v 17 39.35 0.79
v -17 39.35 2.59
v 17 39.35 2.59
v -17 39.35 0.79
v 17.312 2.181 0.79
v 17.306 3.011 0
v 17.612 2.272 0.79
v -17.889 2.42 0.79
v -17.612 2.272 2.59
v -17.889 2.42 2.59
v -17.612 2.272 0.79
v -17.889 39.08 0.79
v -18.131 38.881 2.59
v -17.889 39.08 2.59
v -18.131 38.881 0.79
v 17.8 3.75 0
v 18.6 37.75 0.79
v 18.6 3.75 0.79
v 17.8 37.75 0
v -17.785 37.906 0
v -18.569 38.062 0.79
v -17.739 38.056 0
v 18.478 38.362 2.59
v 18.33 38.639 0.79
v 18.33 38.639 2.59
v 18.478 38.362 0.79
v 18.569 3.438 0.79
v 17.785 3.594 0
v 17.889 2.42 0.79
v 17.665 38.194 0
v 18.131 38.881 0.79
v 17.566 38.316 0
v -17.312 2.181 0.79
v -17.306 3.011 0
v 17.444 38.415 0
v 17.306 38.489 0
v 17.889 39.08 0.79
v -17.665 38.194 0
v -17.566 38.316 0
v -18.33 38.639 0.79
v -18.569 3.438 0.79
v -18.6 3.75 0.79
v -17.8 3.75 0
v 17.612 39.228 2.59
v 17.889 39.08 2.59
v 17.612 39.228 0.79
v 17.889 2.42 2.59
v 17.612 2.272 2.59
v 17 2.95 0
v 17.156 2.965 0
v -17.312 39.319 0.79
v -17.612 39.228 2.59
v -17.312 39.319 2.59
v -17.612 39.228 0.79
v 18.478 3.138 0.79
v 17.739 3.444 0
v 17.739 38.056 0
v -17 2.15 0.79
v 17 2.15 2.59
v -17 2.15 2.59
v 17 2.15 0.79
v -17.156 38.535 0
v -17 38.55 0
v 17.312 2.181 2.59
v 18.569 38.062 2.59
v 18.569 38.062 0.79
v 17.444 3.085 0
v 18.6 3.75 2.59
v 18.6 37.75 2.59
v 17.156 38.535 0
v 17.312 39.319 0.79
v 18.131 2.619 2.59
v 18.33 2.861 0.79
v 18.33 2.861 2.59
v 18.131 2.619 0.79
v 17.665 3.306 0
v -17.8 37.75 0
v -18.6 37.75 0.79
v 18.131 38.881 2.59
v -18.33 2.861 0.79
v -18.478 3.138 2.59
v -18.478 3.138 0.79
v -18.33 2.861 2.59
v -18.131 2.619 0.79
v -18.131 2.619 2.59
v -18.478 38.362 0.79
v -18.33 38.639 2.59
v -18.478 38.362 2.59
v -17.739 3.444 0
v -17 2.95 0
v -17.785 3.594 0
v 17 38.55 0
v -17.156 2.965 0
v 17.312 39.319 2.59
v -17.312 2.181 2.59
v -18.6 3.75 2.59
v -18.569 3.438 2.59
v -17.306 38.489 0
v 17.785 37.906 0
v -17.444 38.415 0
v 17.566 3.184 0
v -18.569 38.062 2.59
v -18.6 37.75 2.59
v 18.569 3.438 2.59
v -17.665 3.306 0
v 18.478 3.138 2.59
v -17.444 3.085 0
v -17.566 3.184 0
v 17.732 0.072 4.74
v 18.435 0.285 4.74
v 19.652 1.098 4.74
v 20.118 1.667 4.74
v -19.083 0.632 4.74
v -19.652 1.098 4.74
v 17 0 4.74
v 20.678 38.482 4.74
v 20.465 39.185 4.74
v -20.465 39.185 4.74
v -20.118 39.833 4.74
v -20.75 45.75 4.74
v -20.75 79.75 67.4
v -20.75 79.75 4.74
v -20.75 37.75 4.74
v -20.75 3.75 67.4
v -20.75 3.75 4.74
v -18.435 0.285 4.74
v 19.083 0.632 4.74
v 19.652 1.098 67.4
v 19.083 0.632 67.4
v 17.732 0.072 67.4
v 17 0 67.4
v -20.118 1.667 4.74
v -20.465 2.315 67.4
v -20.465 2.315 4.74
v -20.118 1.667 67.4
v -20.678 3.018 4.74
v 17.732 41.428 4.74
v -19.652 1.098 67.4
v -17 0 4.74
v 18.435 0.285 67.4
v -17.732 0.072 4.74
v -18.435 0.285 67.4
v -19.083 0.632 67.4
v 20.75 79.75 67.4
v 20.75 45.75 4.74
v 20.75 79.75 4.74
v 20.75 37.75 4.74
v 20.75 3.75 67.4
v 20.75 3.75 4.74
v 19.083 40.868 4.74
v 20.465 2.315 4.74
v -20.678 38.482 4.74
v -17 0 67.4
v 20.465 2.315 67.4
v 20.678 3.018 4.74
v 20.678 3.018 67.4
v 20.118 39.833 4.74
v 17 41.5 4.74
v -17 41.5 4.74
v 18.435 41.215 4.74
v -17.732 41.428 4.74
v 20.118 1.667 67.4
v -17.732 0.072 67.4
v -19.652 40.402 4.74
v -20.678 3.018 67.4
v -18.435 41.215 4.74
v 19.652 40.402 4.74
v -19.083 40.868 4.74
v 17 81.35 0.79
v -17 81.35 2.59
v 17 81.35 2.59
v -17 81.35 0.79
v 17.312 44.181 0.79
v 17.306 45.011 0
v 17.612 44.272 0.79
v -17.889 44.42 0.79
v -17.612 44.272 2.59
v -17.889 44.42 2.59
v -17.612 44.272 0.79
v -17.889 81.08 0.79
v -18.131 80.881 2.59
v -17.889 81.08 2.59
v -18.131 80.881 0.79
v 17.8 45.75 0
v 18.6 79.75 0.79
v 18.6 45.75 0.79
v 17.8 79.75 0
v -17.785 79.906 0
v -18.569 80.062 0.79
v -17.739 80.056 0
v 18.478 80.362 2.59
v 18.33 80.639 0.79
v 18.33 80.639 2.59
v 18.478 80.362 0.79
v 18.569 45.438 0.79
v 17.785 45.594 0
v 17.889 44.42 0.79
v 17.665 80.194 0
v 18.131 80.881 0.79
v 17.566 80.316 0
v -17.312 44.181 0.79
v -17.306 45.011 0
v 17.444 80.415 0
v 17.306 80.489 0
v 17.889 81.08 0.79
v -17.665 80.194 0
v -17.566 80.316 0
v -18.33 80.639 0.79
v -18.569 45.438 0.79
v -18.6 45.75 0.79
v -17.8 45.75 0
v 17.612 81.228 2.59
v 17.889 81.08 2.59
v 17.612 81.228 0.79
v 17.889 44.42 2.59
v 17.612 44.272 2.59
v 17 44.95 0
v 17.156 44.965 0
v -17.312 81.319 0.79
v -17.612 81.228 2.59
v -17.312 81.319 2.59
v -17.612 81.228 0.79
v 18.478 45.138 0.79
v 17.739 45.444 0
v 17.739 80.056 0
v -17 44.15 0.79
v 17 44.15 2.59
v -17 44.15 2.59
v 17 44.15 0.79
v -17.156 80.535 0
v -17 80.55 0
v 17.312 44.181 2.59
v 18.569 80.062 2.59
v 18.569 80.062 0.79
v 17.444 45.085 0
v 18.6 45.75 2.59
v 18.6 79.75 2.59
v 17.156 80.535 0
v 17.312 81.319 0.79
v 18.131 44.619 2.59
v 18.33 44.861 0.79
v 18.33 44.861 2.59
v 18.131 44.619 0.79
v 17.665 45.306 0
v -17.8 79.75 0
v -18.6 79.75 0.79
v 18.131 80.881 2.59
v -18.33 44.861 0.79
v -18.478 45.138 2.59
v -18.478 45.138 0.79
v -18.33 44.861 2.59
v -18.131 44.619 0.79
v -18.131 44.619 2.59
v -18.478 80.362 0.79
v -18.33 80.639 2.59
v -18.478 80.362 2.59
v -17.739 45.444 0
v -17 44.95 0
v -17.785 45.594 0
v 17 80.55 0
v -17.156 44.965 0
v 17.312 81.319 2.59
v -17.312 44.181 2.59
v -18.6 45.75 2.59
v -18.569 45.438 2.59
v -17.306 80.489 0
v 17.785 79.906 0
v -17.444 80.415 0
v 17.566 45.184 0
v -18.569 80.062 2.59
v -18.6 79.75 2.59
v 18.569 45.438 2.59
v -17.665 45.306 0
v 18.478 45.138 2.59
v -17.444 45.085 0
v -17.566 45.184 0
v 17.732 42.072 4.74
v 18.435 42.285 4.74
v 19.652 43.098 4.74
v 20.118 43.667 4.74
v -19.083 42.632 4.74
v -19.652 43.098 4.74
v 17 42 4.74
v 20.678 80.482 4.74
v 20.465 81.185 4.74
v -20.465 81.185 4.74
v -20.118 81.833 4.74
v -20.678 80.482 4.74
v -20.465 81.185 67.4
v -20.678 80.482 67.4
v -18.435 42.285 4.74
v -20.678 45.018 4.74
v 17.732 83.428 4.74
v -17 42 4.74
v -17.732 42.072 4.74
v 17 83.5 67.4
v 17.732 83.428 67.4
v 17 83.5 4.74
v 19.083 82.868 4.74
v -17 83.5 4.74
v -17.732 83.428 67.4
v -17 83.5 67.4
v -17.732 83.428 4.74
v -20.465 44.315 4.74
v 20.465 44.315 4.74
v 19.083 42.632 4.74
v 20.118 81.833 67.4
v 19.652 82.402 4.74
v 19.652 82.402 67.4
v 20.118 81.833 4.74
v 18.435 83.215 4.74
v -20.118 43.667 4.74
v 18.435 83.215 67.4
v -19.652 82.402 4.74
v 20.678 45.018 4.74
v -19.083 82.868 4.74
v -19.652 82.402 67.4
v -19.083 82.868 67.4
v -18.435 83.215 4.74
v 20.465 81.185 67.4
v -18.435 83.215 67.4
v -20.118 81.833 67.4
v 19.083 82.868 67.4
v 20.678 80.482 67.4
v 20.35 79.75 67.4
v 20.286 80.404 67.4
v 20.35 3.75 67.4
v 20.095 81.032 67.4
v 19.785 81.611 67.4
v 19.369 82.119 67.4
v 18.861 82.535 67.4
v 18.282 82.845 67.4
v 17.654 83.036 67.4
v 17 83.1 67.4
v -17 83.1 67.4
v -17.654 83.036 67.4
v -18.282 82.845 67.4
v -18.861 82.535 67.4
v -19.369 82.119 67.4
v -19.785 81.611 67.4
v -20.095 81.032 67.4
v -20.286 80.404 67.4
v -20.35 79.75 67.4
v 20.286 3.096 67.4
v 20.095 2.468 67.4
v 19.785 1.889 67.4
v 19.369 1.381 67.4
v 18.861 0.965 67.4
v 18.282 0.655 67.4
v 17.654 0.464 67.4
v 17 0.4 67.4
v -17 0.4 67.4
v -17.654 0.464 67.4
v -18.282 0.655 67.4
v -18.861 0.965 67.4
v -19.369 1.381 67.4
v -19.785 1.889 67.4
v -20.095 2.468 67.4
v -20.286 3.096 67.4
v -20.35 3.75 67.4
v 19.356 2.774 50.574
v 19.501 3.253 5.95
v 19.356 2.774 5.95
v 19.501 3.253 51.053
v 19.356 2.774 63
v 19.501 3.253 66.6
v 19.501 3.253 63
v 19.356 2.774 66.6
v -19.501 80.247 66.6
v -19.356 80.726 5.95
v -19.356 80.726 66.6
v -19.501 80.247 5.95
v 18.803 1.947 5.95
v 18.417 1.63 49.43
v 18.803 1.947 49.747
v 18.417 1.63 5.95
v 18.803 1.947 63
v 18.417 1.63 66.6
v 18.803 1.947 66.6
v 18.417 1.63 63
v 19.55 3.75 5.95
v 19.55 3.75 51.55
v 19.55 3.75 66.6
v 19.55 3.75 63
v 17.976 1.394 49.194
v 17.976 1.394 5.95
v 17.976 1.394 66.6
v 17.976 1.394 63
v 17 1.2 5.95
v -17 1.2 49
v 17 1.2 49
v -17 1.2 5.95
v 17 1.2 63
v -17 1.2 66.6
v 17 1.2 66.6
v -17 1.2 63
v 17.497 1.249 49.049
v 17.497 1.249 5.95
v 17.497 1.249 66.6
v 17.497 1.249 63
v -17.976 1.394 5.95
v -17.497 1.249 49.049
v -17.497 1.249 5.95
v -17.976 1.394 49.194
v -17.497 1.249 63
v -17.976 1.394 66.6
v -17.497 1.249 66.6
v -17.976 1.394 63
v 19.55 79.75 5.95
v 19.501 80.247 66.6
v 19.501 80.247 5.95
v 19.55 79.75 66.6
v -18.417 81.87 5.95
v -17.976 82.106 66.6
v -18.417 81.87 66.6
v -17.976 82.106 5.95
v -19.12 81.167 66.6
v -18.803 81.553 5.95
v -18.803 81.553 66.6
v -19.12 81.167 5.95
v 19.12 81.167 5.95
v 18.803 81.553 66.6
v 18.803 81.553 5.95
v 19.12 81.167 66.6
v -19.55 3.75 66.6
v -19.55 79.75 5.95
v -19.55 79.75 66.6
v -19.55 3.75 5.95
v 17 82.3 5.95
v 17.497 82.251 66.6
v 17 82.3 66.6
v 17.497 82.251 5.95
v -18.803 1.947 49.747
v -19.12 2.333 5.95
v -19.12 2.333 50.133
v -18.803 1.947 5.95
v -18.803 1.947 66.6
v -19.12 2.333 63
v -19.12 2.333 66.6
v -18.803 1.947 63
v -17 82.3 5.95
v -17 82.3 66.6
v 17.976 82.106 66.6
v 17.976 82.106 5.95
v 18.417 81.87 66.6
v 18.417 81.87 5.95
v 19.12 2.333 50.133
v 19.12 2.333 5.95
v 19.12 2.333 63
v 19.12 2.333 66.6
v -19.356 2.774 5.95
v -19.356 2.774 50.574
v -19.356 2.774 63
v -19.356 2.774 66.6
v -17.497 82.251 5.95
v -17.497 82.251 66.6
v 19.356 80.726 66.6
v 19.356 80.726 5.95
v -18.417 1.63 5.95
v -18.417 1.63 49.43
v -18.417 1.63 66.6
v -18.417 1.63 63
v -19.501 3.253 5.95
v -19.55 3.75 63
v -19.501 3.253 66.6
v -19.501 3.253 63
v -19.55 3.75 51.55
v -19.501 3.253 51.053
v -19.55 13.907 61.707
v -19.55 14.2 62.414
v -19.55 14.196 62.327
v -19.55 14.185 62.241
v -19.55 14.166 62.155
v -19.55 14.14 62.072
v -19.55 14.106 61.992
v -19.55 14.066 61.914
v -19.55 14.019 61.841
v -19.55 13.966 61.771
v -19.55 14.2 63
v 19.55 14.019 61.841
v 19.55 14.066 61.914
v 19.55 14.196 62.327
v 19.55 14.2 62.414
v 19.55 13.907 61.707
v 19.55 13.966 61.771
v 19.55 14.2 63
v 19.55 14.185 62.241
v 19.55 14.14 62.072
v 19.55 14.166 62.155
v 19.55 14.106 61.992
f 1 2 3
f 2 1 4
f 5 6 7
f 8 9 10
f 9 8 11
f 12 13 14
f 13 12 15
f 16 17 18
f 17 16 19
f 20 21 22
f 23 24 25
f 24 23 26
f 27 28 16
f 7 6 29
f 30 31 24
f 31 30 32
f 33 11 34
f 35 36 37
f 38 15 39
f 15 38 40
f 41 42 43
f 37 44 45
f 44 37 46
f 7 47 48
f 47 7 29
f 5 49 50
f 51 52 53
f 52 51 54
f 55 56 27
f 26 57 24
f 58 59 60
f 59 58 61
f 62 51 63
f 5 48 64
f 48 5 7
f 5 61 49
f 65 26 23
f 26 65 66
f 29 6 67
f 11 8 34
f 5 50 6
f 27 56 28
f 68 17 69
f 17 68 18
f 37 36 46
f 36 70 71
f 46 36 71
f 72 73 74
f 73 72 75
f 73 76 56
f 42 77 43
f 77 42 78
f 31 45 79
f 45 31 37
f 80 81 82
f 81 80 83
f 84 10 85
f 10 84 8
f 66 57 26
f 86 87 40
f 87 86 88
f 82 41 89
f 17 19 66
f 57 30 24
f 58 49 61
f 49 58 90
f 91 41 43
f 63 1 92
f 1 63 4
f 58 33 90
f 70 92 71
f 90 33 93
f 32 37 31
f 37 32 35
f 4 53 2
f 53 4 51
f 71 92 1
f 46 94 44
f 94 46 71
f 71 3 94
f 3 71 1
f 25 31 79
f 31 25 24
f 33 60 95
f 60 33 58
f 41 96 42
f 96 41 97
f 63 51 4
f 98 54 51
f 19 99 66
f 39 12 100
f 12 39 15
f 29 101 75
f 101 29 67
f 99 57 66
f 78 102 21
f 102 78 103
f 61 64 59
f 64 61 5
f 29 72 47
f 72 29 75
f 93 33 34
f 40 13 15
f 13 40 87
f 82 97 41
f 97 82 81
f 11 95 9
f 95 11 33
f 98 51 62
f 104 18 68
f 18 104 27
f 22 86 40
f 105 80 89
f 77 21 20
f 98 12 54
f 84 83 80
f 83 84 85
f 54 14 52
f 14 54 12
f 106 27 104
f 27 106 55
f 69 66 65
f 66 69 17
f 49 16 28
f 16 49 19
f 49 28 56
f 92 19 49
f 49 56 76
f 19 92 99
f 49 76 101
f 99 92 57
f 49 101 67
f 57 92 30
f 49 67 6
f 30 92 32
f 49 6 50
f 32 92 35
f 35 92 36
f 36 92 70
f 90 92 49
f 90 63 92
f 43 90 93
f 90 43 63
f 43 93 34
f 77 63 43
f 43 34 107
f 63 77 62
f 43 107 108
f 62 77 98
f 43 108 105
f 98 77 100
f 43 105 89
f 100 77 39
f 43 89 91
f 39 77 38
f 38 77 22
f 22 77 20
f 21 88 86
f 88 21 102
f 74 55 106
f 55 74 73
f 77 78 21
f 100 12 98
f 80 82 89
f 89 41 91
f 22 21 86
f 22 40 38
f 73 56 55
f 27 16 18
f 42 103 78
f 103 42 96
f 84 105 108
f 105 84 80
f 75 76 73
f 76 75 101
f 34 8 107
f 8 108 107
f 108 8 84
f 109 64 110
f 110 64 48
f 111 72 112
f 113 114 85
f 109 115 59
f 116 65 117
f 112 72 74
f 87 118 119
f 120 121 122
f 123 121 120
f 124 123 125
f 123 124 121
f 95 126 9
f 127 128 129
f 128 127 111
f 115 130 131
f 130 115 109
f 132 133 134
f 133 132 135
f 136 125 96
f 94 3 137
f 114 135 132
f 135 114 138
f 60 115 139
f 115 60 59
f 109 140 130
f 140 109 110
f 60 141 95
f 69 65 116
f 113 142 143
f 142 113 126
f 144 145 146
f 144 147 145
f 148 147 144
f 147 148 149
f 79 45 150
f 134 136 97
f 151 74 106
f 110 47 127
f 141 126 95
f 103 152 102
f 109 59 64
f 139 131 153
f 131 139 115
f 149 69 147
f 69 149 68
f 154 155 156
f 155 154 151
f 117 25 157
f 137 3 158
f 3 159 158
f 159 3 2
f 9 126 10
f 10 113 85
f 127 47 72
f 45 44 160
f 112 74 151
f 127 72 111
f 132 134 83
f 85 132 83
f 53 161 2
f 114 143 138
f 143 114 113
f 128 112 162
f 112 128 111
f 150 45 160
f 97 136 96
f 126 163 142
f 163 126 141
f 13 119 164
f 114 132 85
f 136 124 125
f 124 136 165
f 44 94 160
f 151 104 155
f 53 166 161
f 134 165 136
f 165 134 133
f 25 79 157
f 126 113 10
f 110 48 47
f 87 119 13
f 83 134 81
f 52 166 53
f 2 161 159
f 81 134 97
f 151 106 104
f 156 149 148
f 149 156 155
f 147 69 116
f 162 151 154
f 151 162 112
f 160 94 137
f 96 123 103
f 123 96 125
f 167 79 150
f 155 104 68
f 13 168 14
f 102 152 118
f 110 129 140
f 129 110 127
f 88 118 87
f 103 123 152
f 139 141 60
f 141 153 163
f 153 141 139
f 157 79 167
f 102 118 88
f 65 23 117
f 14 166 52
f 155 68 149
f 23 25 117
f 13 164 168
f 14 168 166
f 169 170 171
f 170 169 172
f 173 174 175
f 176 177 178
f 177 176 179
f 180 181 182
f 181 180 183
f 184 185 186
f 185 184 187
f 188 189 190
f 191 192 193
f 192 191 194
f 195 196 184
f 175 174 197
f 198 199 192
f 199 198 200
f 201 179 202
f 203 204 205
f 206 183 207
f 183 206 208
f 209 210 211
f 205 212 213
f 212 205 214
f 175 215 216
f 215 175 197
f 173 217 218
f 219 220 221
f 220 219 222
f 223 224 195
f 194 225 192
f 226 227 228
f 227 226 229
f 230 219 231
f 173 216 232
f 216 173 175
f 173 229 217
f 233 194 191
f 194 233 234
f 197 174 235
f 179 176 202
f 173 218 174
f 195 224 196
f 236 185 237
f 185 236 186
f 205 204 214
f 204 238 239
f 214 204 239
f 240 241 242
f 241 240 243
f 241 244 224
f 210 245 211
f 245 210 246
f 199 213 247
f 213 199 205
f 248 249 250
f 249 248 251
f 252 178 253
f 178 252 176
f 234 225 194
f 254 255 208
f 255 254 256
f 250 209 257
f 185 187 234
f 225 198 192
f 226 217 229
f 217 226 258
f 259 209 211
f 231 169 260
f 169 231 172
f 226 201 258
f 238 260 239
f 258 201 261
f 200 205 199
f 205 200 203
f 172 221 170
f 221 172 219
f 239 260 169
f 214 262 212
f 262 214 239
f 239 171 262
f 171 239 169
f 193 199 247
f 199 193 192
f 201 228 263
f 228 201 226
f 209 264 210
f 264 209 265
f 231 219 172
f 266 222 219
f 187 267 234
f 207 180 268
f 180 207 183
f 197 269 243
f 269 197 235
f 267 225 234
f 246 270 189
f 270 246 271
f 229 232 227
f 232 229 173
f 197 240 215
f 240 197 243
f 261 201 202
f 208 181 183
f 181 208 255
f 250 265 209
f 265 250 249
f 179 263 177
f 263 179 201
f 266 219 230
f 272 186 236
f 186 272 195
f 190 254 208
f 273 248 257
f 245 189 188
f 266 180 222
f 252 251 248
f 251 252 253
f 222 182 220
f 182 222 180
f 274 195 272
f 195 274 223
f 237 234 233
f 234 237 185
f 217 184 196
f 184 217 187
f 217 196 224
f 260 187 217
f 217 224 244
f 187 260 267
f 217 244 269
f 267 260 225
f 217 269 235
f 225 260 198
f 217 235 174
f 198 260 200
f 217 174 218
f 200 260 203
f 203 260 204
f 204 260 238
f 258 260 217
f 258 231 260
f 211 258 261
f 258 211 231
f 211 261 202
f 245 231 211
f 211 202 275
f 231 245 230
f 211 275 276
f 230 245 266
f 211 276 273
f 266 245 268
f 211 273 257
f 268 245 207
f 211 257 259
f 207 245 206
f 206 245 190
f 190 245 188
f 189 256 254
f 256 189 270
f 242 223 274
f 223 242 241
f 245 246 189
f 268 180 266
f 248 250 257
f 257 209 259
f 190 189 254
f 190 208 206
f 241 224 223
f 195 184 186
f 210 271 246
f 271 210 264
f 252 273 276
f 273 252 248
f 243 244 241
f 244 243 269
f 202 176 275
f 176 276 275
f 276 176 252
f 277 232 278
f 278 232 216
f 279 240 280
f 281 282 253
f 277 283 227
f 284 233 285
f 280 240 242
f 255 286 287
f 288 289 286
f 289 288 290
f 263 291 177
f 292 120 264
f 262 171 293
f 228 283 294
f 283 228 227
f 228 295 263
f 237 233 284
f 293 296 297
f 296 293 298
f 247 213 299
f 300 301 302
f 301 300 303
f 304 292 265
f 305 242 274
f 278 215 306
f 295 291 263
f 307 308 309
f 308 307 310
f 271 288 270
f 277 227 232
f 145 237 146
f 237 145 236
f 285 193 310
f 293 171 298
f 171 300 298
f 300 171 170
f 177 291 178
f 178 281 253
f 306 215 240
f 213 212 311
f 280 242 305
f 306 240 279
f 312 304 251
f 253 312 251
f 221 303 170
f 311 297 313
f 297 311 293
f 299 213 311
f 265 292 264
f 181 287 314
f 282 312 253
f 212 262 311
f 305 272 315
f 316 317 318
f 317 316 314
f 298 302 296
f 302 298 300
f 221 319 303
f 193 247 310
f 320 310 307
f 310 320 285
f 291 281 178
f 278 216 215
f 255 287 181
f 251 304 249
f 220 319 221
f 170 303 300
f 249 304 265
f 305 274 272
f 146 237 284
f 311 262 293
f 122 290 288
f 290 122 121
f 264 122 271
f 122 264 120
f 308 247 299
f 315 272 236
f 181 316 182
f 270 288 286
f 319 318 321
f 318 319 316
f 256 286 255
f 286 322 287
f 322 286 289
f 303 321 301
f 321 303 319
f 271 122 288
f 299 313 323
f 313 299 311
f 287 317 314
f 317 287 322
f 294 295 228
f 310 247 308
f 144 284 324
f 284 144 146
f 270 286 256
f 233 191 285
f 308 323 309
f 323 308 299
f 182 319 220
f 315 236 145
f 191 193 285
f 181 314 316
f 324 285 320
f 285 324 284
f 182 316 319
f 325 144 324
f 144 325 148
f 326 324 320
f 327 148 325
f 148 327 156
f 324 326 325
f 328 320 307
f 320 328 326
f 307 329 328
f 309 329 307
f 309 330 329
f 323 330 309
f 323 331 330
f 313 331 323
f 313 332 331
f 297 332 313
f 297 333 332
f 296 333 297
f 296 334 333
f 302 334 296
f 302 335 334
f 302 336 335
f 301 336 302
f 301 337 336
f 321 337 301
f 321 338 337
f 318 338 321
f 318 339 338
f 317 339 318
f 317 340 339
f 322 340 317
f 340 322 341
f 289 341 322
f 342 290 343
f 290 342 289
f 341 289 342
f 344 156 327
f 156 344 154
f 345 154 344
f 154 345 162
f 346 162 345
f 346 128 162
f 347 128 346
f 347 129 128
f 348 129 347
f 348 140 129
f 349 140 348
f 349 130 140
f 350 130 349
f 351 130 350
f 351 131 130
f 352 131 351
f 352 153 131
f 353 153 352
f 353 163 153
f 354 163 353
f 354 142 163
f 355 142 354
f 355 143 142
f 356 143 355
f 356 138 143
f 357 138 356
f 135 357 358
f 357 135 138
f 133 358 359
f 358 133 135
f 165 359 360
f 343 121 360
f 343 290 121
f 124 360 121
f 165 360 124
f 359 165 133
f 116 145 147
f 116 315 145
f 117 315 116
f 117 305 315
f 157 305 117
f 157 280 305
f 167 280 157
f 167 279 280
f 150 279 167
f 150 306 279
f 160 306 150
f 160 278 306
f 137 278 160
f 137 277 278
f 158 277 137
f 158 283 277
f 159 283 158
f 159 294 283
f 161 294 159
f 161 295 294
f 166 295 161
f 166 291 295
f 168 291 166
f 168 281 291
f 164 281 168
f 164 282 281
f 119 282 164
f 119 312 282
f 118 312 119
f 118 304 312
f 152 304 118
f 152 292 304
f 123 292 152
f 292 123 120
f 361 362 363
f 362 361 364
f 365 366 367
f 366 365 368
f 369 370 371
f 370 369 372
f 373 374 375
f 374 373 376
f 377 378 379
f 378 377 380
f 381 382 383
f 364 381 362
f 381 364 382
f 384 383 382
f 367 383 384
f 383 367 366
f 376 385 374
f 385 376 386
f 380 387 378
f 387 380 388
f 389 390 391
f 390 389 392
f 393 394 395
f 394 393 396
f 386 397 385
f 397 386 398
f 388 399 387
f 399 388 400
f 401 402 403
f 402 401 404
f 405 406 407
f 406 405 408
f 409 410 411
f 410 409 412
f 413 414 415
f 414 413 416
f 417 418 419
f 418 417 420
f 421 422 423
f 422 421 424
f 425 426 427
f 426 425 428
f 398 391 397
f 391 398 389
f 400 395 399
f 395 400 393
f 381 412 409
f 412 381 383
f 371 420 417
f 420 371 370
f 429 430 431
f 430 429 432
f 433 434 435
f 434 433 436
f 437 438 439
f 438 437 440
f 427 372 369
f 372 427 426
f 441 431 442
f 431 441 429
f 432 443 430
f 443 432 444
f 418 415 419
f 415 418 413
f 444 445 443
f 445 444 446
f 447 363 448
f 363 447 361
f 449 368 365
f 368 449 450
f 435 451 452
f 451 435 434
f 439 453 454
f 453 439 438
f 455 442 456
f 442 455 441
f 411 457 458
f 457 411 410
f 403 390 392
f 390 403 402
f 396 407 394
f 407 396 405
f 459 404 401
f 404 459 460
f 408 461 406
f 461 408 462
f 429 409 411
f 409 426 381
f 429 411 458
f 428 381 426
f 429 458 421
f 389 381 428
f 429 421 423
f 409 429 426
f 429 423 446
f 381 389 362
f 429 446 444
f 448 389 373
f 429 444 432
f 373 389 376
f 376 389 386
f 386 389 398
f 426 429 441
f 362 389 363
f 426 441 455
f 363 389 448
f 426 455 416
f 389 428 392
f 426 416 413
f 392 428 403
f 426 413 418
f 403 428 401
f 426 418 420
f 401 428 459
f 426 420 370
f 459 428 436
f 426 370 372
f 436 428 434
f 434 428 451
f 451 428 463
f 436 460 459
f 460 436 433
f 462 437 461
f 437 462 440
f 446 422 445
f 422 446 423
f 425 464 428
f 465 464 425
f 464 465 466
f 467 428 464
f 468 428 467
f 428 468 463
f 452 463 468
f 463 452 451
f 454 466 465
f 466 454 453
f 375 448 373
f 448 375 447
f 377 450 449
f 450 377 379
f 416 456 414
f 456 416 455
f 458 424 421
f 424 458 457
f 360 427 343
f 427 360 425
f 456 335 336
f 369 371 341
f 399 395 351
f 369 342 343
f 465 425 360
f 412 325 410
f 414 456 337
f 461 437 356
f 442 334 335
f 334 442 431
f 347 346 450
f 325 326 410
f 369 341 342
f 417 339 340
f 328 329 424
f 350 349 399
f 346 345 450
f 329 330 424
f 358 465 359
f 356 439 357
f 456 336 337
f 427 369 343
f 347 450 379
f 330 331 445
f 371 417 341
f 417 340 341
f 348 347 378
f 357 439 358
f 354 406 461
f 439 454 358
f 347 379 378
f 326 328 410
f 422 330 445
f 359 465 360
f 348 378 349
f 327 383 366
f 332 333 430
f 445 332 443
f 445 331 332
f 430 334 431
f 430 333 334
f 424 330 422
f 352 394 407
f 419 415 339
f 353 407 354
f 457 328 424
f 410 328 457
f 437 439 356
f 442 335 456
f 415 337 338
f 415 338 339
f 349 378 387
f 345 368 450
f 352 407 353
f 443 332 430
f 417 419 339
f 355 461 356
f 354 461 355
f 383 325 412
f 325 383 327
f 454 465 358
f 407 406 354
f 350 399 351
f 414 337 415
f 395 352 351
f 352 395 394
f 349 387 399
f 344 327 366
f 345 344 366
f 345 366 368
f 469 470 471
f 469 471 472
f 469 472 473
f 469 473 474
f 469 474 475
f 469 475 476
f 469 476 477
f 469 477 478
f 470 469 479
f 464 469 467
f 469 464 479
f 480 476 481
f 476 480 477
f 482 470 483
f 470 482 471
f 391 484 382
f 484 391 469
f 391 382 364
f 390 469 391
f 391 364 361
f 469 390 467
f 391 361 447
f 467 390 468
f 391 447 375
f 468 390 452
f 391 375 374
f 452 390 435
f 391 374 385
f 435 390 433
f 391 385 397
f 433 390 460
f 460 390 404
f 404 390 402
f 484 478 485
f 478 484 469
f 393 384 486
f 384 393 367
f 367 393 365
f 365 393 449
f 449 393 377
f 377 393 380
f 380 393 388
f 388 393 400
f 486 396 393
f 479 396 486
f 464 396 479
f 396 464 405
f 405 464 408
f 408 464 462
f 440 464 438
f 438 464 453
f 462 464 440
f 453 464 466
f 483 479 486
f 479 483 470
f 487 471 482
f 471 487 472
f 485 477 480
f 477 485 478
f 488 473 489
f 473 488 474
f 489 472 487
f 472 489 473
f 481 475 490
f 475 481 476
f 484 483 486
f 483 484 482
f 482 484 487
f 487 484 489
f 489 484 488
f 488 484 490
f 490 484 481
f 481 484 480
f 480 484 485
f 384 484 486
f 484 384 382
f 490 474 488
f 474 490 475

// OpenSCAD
// file: ../../../modules/gridfinity.scad
// Gridfinity ベースプレートの共有 module。
// 寸法は Gridfinity 仕様 (Zack Freedman) の baseplate 輪郭に従う:
//   ピッチ 42、ソケット上端開口 41.5 (角 R4)、上から 45° 面取り 2.15 →
//   垂直 1.8 (37.2 角・R1.85) → 45° 面取り 0.7 → 底 35.8 角 (R1.15)。
//   ソケット深さ = 2.15 + 1.8 + 0.7 = 4.65。
//
// 座標系: X が列方向 (中央が 0)、Y が行方向 (板の前端が 0)、Z=0 が板の底面。
// 板の外形は grid とは独立に rim で与えるので、grid より大きい板 (縁付き) を
// 作れる。ソケットは rim=[left, right, front, back] の内側へ 42 ピッチで並ぶ。

gf_pitch = 42;
gf_socket_top = 41.5; // 上端開口
gf_socket_mid = 37.2; // 垂直部
gf_socket_bot = 35.8; // 底
gf_socket_r_top = 4;
gf_socket_r_mid = 1.85;
gf_socket_r_bot = 1.15;
gf_chamfer_top = 2.15;
gf_wall_h = 1.8;
gf_chamfer_bot = 0.7;
gf_socket_depth = gf_chamfer_top + gf_wall_h + gf_chamfer_bot; // 4.65
gf_fn = 32;
gf_eps = 0.01; // hull 用の薄板の厚さ
gf_over = 0.5; // 切削の抜き代

// 角丸正方形または矩形 (w は一辺、または [幅, 奥行き]、角 R)
module
gf_rounded_square(w, r)
{
    offset(r = r, $fn = gf_fn)
        square(is_list(w) ? w - [ 2 * r, 2 * r ] : w - 2 * r, center = true);
}

// 厚さ gf_eps の角丸正方形の薄板を z に置く (hull の骨)
module
gf_slab(w, r, z)
{
    translate([ 0, 0, z ]) linear_extrude(gf_eps) gf_rounded_square(w, r);
}

// ソケット1個の切削体。z=0 がソケットの底 (床の天面)、+Z へ 4.65 で天面に出る。
// clearance は嵌合の逃げで、輪郭を全周へ clearance だけ外へ出す (幅 +2c、角 R
// +c)。pitch_x は X 方向のセル幅。端数でも角 R と面取りの寸法を保つ。
module
gf_socket_cut(clearance = 0, pitch_x = gf_pitch)
{
    z1 = gf_chamfer_bot;
    z2 = z1 + gf_wall_h;
    z3 = gf_socket_depth;
    c = clearance;
    assert(pitch_x > gf_pitch - gf_socket_top + 2 * gf_socket_r_top,
           "Cell width is too small for the socket corner radius");
    delta = [ pitch_x - gf_pitch, 0 ];
    bot = [ gf_socket_bot + 2 * c, gf_socket_bot + 2 * c ] + delta;
    mid = [ gf_socket_mid + 2 * c, gf_socket_mid + 2 * c ] + delta;
    top = [ gf_socket_top + 2 * c, gf_socket_top + 2 * c ] + delta;
    hull()
    {
        gf_slab(bot, gf_socket_r_bot + c, 0);
        gf_slab(mid, gf_socket_r_mid + c, z1 - gf_eps);
    }
    hull()
    {
        gf_slab(mid, gf_socket_r_mid + c, z1 - gf_eps);
        gf_slab(mid, gf_socket_r_mid + c, z2 - gf_eps);
    }
    hull()
    {
        gf_slab(mid, gf_socket_r_mid + c, z2 - gf_eps);
        gf_slab(top, gf_socket_r_top + c, z3 - gf_eps);
    }
    // 天面より上へ抜く (天面と同一平面の退化した面を残さない)
    gf_slab(top, gf_socket_r_top + c, z3 - gf_eps);
    translate([ 0, 0, z3 - gf_eps ]) linear_extrude(gf_over + gf_eps)
        gf_rounded_square(top, gf_socket_r_top + c);
}

// ベースプレート。cols x rows のソケットを床 floor_t の上に彫る。
// rim = [left, right, front, back] はソケット列の外側に残す縁の幅。
// 板の幅 = cols*42 + left + right、奥行き = rows*42 + front + back。
// cols の端数は左端の細幅セルになる。rows は正の整数。
// clearance はソケットの嵌合の逃げ (gf_socket_cut を参照)。
module
gf_baseplate(cols, rows, rim = [ 0, 0, 0, 0 ], floor_t = 1, clearance = 0)
{
    grid_w = cols * gf_pitch;
    grid_d = rows * gf_pitch;
    plate_w = grid_w + rim[0] + rim[1];
    plate_d = grid_d + rim[2] + rim[3];
    x0 = -plate_w / 2 + rim[0]; // ソケット列の左端
    first_pitch = grid_w - (ceil(cols) - 1) * gf_pitch;
    difference()
    {
        translate([ -plate_w / 2, 0, 0 ])
            cube([ plate_w, plate_d, floor_t + gf_socket_depth ]);
        for (c = [0:ceil(cols) - 1], r = [0:rows - 1])
            translate([
                x0 + (c == 0 ? first_pitch / 2
                             : first_pitch + (c - 0.5) * gf_pitch),
                rim[2] + (r + 0.5) * gf_pitch,
                floor_t
            ]) gf_socket_cut(clearance, c == 0 ? first_pitch : gf_pitch);
    }
}
// file: ../../../modules/gridfinity_bins.scad
include <gridfinity_bin.scad>

// assets/gridfinity-bin/ の bin 群の共通値と、サイズ 3 引数の払い出し口。
// 単体では何も描かない。設計の経緯と確定値は
// ledger/designs/gridfinity-bin-4u.md が正本。
// 通常binは4U/9U、X={1,1.5,2,2.5,3} × Y={1,2,3,4,5,5.5}。
// 両軸に端数を持つ組み合わせはassetに置かない（各高さ28種）。
// Xが横、Yがラベルの壁から奥、unitsが高さ（7mm単位）。
wall = 1.2;    // 0.4 ノズル 3 本
floor_t = 1.2; // 底 (4.75) の上に載せる床。床の天面 z = 5.95
label_d = 13;  // 12mm 幅のラベルシールを貼る天板の張り出し
label_t = 1; // 天板の厚さ (user 指定)。下は 45° の無垢のくさび
label_r = 1; // 天板の先端と 45° 面の境目の R (user 指定)
// カードケース (goods/card_case_2x3x4u.scad) の値。カードは ISO/IEC 7810 ID-1 (85.6 × 54 ×
// 0.76、隅 R3) で、長辺を Y (rows 方向) に寝かせ、X 中央・手前の壁から 10 奥に置く。ポケットは
// カードより 1 大きい (片側 0.5)。右奥のマスは壁の内面まで抜き、床と底を外形に平行な 45° の窪みにする。
// ポケットの左右の埋めの天面 (幅 13.05) が 12mm のラベルを貼る帯。ポケットと穴の交点の
// 縦エッジは丸める (開口の上縁は丸めない: 壁を上端まで垂直に保ち、収まる枚数を減らさない)
card_w = 54;    // カードの短辺 (X)。user 指定「高さ 54」
card_d = 85.6;  // カードの長辺 (Y)。user 指定「幅 85.6」
card_clear = 1; // ポケットの余裕 (user 指定「+1mm」)
// ポケットの手前の辺の、手前の壁の内面からの距離 (user 指定「10mm」)
card_off = 10;
// ポケットの平面の隅 R (user 指定「角の丸み 3mm」。ID-1 の隅は 2.88..3.48)
card_r = 3;
// ポケットと穴が交わる所の、埋めの凸の縦エッジの R (指の当たる角)
card_edge_r = 2;
recess_skin = floor_t + 1.75; // 窪みの床 z (底の皮)。user 指定「壁厚と同じ 1.2 は過剰、1.75 返す」

function bin_contract(cols, rows, units) = str("CONTRACT units=",
                                               units,
                                               " pitch=",
                                               gf_pitch,
                                               " outer=",
                                               gfb_outer,
                                               " h=",
                                               units* gfb_unit,
                                               " lip=",
                                               gfb_lip_h,
                                               " base=",
                                               gfb_base_bot,
                                               "/",
                                               gfb_base_mid,
                                               "/",
                                               gfb_outer,
                                               " base_h=",
                                               gfb_base_h,
                                               " wall=",
                                               wall,
                                               " floor_top=",
                                               gfb_base_h + floor_t,
                                               " label=",
                                               label_d,
                                               "x",
                                               label_t,
                                               " wedge=45 fillet=",
                                               label_r,
                                               " bin=",
                                               cols,
                                               "x",
                                               rows,
                                               " size=",
                                               cols* gf_pitch - 0.5,
                                               "x",
                                               rows* gf_pitch - 0.5);

// (cols, rows, units) でラベル付き bin を払い出す。例: gridfinity_bin(2, 4, 4)
module
gridfinity_bin(cols, rows, units = 4)
{
    echo(bin_contract(cols, rows, units));
    gfb_bin(cols, rows, units, wall, floor_t, label_d, label_t, label_r);
}

function card_contract(cols, rows, units) = str("CONTRACT card units=",
                                                units,
                                                " bin=",
                                                cols,
                                                "x",
                                                rows,
                                                " size=",
                                                cols* gf_pitch - 0.5,
                                                "x",
                                                rows* gf_pitch - 0.5,
                                                " h=",
                                                units* gfb_unit,
                                                " lip=",
                                                gfb_lip_h,
                                                " floor_top=",
                                                gfb_base_h + floor_t,
                                                " card=",
                                                card_w,
                                                "x",
                                                card_d,
                                                " pocket=",
                                                card_w + card_clear,
                                                "x",
                                                card_d + card_clear,
                                                " at=",
                                                -(card_w + card_clear) / 2,
                                                ",",
                                                wall + card_off,
                                                " hole=",
                                                (cols - 1) / 2 * gf_pitch - gfb_outer / 2,
                                                ",",
                                                (rows - 0.5) * gf_pitch - 0.25 - gfb_outer / 2,
                                                " hole_r=",
                                                gfb_outer_r - wall,
                                                " recess=",
                                                gfb_outer - 2 * wall,
                                                "/",
                                                gfb_base_mid - 2 * wall,
                                                " recess_floor=",
                                                recess_skin,
                                                " r=",
                                                card_r,
                                                " edge_r=",
                                                card_edge_r);

// (cols, rows, units) でカードケースを払い出す。例: gridfinity_card_case(2, 3, 4)
module
gridfinity_card_case(cols, rows, units = 4)
{
    echo(card_contract(cols, rows, units));
    gfb_card_case(cols,
                  rows,
                  units,
                  wall,
                  floor_t,
                  [ card_w, card_d ],
                  card_clear,
                  card_off,
                  card_r,
                  recess_skin,
                  card_edge_r);
}
// main file
include <../../../modules/gridfinity_bins.scad>

gridfinity_bin(1, 2, 9);
